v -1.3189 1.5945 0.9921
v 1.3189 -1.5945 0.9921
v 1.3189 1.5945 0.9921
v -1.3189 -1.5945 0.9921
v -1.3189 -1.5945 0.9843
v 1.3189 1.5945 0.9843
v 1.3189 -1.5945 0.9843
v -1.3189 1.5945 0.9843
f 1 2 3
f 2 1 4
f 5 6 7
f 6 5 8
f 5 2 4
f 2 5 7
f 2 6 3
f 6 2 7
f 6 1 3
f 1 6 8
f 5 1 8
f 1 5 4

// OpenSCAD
// file: defines.scad
w = 9.7;
h = 10.10;
t = 2.5;
pcb_t = 0.8;
pin_fragments = 16;

scale = 1/2.54;
// main file
include <defines.scad>

lw = w - 3.0;
lh = h - 2.0;

/*color("White")
  translate([-w/2 + 0.25,   h/2 - 2.25,  0.8])
    cube(size = [2.5, 2, 0.02], center = false);*/

// Label

color("White")
  scale(scale)
  translate([-lw/2, -lh/2, t])
    cube(size = [lw, lh, 0.02], center = false);
